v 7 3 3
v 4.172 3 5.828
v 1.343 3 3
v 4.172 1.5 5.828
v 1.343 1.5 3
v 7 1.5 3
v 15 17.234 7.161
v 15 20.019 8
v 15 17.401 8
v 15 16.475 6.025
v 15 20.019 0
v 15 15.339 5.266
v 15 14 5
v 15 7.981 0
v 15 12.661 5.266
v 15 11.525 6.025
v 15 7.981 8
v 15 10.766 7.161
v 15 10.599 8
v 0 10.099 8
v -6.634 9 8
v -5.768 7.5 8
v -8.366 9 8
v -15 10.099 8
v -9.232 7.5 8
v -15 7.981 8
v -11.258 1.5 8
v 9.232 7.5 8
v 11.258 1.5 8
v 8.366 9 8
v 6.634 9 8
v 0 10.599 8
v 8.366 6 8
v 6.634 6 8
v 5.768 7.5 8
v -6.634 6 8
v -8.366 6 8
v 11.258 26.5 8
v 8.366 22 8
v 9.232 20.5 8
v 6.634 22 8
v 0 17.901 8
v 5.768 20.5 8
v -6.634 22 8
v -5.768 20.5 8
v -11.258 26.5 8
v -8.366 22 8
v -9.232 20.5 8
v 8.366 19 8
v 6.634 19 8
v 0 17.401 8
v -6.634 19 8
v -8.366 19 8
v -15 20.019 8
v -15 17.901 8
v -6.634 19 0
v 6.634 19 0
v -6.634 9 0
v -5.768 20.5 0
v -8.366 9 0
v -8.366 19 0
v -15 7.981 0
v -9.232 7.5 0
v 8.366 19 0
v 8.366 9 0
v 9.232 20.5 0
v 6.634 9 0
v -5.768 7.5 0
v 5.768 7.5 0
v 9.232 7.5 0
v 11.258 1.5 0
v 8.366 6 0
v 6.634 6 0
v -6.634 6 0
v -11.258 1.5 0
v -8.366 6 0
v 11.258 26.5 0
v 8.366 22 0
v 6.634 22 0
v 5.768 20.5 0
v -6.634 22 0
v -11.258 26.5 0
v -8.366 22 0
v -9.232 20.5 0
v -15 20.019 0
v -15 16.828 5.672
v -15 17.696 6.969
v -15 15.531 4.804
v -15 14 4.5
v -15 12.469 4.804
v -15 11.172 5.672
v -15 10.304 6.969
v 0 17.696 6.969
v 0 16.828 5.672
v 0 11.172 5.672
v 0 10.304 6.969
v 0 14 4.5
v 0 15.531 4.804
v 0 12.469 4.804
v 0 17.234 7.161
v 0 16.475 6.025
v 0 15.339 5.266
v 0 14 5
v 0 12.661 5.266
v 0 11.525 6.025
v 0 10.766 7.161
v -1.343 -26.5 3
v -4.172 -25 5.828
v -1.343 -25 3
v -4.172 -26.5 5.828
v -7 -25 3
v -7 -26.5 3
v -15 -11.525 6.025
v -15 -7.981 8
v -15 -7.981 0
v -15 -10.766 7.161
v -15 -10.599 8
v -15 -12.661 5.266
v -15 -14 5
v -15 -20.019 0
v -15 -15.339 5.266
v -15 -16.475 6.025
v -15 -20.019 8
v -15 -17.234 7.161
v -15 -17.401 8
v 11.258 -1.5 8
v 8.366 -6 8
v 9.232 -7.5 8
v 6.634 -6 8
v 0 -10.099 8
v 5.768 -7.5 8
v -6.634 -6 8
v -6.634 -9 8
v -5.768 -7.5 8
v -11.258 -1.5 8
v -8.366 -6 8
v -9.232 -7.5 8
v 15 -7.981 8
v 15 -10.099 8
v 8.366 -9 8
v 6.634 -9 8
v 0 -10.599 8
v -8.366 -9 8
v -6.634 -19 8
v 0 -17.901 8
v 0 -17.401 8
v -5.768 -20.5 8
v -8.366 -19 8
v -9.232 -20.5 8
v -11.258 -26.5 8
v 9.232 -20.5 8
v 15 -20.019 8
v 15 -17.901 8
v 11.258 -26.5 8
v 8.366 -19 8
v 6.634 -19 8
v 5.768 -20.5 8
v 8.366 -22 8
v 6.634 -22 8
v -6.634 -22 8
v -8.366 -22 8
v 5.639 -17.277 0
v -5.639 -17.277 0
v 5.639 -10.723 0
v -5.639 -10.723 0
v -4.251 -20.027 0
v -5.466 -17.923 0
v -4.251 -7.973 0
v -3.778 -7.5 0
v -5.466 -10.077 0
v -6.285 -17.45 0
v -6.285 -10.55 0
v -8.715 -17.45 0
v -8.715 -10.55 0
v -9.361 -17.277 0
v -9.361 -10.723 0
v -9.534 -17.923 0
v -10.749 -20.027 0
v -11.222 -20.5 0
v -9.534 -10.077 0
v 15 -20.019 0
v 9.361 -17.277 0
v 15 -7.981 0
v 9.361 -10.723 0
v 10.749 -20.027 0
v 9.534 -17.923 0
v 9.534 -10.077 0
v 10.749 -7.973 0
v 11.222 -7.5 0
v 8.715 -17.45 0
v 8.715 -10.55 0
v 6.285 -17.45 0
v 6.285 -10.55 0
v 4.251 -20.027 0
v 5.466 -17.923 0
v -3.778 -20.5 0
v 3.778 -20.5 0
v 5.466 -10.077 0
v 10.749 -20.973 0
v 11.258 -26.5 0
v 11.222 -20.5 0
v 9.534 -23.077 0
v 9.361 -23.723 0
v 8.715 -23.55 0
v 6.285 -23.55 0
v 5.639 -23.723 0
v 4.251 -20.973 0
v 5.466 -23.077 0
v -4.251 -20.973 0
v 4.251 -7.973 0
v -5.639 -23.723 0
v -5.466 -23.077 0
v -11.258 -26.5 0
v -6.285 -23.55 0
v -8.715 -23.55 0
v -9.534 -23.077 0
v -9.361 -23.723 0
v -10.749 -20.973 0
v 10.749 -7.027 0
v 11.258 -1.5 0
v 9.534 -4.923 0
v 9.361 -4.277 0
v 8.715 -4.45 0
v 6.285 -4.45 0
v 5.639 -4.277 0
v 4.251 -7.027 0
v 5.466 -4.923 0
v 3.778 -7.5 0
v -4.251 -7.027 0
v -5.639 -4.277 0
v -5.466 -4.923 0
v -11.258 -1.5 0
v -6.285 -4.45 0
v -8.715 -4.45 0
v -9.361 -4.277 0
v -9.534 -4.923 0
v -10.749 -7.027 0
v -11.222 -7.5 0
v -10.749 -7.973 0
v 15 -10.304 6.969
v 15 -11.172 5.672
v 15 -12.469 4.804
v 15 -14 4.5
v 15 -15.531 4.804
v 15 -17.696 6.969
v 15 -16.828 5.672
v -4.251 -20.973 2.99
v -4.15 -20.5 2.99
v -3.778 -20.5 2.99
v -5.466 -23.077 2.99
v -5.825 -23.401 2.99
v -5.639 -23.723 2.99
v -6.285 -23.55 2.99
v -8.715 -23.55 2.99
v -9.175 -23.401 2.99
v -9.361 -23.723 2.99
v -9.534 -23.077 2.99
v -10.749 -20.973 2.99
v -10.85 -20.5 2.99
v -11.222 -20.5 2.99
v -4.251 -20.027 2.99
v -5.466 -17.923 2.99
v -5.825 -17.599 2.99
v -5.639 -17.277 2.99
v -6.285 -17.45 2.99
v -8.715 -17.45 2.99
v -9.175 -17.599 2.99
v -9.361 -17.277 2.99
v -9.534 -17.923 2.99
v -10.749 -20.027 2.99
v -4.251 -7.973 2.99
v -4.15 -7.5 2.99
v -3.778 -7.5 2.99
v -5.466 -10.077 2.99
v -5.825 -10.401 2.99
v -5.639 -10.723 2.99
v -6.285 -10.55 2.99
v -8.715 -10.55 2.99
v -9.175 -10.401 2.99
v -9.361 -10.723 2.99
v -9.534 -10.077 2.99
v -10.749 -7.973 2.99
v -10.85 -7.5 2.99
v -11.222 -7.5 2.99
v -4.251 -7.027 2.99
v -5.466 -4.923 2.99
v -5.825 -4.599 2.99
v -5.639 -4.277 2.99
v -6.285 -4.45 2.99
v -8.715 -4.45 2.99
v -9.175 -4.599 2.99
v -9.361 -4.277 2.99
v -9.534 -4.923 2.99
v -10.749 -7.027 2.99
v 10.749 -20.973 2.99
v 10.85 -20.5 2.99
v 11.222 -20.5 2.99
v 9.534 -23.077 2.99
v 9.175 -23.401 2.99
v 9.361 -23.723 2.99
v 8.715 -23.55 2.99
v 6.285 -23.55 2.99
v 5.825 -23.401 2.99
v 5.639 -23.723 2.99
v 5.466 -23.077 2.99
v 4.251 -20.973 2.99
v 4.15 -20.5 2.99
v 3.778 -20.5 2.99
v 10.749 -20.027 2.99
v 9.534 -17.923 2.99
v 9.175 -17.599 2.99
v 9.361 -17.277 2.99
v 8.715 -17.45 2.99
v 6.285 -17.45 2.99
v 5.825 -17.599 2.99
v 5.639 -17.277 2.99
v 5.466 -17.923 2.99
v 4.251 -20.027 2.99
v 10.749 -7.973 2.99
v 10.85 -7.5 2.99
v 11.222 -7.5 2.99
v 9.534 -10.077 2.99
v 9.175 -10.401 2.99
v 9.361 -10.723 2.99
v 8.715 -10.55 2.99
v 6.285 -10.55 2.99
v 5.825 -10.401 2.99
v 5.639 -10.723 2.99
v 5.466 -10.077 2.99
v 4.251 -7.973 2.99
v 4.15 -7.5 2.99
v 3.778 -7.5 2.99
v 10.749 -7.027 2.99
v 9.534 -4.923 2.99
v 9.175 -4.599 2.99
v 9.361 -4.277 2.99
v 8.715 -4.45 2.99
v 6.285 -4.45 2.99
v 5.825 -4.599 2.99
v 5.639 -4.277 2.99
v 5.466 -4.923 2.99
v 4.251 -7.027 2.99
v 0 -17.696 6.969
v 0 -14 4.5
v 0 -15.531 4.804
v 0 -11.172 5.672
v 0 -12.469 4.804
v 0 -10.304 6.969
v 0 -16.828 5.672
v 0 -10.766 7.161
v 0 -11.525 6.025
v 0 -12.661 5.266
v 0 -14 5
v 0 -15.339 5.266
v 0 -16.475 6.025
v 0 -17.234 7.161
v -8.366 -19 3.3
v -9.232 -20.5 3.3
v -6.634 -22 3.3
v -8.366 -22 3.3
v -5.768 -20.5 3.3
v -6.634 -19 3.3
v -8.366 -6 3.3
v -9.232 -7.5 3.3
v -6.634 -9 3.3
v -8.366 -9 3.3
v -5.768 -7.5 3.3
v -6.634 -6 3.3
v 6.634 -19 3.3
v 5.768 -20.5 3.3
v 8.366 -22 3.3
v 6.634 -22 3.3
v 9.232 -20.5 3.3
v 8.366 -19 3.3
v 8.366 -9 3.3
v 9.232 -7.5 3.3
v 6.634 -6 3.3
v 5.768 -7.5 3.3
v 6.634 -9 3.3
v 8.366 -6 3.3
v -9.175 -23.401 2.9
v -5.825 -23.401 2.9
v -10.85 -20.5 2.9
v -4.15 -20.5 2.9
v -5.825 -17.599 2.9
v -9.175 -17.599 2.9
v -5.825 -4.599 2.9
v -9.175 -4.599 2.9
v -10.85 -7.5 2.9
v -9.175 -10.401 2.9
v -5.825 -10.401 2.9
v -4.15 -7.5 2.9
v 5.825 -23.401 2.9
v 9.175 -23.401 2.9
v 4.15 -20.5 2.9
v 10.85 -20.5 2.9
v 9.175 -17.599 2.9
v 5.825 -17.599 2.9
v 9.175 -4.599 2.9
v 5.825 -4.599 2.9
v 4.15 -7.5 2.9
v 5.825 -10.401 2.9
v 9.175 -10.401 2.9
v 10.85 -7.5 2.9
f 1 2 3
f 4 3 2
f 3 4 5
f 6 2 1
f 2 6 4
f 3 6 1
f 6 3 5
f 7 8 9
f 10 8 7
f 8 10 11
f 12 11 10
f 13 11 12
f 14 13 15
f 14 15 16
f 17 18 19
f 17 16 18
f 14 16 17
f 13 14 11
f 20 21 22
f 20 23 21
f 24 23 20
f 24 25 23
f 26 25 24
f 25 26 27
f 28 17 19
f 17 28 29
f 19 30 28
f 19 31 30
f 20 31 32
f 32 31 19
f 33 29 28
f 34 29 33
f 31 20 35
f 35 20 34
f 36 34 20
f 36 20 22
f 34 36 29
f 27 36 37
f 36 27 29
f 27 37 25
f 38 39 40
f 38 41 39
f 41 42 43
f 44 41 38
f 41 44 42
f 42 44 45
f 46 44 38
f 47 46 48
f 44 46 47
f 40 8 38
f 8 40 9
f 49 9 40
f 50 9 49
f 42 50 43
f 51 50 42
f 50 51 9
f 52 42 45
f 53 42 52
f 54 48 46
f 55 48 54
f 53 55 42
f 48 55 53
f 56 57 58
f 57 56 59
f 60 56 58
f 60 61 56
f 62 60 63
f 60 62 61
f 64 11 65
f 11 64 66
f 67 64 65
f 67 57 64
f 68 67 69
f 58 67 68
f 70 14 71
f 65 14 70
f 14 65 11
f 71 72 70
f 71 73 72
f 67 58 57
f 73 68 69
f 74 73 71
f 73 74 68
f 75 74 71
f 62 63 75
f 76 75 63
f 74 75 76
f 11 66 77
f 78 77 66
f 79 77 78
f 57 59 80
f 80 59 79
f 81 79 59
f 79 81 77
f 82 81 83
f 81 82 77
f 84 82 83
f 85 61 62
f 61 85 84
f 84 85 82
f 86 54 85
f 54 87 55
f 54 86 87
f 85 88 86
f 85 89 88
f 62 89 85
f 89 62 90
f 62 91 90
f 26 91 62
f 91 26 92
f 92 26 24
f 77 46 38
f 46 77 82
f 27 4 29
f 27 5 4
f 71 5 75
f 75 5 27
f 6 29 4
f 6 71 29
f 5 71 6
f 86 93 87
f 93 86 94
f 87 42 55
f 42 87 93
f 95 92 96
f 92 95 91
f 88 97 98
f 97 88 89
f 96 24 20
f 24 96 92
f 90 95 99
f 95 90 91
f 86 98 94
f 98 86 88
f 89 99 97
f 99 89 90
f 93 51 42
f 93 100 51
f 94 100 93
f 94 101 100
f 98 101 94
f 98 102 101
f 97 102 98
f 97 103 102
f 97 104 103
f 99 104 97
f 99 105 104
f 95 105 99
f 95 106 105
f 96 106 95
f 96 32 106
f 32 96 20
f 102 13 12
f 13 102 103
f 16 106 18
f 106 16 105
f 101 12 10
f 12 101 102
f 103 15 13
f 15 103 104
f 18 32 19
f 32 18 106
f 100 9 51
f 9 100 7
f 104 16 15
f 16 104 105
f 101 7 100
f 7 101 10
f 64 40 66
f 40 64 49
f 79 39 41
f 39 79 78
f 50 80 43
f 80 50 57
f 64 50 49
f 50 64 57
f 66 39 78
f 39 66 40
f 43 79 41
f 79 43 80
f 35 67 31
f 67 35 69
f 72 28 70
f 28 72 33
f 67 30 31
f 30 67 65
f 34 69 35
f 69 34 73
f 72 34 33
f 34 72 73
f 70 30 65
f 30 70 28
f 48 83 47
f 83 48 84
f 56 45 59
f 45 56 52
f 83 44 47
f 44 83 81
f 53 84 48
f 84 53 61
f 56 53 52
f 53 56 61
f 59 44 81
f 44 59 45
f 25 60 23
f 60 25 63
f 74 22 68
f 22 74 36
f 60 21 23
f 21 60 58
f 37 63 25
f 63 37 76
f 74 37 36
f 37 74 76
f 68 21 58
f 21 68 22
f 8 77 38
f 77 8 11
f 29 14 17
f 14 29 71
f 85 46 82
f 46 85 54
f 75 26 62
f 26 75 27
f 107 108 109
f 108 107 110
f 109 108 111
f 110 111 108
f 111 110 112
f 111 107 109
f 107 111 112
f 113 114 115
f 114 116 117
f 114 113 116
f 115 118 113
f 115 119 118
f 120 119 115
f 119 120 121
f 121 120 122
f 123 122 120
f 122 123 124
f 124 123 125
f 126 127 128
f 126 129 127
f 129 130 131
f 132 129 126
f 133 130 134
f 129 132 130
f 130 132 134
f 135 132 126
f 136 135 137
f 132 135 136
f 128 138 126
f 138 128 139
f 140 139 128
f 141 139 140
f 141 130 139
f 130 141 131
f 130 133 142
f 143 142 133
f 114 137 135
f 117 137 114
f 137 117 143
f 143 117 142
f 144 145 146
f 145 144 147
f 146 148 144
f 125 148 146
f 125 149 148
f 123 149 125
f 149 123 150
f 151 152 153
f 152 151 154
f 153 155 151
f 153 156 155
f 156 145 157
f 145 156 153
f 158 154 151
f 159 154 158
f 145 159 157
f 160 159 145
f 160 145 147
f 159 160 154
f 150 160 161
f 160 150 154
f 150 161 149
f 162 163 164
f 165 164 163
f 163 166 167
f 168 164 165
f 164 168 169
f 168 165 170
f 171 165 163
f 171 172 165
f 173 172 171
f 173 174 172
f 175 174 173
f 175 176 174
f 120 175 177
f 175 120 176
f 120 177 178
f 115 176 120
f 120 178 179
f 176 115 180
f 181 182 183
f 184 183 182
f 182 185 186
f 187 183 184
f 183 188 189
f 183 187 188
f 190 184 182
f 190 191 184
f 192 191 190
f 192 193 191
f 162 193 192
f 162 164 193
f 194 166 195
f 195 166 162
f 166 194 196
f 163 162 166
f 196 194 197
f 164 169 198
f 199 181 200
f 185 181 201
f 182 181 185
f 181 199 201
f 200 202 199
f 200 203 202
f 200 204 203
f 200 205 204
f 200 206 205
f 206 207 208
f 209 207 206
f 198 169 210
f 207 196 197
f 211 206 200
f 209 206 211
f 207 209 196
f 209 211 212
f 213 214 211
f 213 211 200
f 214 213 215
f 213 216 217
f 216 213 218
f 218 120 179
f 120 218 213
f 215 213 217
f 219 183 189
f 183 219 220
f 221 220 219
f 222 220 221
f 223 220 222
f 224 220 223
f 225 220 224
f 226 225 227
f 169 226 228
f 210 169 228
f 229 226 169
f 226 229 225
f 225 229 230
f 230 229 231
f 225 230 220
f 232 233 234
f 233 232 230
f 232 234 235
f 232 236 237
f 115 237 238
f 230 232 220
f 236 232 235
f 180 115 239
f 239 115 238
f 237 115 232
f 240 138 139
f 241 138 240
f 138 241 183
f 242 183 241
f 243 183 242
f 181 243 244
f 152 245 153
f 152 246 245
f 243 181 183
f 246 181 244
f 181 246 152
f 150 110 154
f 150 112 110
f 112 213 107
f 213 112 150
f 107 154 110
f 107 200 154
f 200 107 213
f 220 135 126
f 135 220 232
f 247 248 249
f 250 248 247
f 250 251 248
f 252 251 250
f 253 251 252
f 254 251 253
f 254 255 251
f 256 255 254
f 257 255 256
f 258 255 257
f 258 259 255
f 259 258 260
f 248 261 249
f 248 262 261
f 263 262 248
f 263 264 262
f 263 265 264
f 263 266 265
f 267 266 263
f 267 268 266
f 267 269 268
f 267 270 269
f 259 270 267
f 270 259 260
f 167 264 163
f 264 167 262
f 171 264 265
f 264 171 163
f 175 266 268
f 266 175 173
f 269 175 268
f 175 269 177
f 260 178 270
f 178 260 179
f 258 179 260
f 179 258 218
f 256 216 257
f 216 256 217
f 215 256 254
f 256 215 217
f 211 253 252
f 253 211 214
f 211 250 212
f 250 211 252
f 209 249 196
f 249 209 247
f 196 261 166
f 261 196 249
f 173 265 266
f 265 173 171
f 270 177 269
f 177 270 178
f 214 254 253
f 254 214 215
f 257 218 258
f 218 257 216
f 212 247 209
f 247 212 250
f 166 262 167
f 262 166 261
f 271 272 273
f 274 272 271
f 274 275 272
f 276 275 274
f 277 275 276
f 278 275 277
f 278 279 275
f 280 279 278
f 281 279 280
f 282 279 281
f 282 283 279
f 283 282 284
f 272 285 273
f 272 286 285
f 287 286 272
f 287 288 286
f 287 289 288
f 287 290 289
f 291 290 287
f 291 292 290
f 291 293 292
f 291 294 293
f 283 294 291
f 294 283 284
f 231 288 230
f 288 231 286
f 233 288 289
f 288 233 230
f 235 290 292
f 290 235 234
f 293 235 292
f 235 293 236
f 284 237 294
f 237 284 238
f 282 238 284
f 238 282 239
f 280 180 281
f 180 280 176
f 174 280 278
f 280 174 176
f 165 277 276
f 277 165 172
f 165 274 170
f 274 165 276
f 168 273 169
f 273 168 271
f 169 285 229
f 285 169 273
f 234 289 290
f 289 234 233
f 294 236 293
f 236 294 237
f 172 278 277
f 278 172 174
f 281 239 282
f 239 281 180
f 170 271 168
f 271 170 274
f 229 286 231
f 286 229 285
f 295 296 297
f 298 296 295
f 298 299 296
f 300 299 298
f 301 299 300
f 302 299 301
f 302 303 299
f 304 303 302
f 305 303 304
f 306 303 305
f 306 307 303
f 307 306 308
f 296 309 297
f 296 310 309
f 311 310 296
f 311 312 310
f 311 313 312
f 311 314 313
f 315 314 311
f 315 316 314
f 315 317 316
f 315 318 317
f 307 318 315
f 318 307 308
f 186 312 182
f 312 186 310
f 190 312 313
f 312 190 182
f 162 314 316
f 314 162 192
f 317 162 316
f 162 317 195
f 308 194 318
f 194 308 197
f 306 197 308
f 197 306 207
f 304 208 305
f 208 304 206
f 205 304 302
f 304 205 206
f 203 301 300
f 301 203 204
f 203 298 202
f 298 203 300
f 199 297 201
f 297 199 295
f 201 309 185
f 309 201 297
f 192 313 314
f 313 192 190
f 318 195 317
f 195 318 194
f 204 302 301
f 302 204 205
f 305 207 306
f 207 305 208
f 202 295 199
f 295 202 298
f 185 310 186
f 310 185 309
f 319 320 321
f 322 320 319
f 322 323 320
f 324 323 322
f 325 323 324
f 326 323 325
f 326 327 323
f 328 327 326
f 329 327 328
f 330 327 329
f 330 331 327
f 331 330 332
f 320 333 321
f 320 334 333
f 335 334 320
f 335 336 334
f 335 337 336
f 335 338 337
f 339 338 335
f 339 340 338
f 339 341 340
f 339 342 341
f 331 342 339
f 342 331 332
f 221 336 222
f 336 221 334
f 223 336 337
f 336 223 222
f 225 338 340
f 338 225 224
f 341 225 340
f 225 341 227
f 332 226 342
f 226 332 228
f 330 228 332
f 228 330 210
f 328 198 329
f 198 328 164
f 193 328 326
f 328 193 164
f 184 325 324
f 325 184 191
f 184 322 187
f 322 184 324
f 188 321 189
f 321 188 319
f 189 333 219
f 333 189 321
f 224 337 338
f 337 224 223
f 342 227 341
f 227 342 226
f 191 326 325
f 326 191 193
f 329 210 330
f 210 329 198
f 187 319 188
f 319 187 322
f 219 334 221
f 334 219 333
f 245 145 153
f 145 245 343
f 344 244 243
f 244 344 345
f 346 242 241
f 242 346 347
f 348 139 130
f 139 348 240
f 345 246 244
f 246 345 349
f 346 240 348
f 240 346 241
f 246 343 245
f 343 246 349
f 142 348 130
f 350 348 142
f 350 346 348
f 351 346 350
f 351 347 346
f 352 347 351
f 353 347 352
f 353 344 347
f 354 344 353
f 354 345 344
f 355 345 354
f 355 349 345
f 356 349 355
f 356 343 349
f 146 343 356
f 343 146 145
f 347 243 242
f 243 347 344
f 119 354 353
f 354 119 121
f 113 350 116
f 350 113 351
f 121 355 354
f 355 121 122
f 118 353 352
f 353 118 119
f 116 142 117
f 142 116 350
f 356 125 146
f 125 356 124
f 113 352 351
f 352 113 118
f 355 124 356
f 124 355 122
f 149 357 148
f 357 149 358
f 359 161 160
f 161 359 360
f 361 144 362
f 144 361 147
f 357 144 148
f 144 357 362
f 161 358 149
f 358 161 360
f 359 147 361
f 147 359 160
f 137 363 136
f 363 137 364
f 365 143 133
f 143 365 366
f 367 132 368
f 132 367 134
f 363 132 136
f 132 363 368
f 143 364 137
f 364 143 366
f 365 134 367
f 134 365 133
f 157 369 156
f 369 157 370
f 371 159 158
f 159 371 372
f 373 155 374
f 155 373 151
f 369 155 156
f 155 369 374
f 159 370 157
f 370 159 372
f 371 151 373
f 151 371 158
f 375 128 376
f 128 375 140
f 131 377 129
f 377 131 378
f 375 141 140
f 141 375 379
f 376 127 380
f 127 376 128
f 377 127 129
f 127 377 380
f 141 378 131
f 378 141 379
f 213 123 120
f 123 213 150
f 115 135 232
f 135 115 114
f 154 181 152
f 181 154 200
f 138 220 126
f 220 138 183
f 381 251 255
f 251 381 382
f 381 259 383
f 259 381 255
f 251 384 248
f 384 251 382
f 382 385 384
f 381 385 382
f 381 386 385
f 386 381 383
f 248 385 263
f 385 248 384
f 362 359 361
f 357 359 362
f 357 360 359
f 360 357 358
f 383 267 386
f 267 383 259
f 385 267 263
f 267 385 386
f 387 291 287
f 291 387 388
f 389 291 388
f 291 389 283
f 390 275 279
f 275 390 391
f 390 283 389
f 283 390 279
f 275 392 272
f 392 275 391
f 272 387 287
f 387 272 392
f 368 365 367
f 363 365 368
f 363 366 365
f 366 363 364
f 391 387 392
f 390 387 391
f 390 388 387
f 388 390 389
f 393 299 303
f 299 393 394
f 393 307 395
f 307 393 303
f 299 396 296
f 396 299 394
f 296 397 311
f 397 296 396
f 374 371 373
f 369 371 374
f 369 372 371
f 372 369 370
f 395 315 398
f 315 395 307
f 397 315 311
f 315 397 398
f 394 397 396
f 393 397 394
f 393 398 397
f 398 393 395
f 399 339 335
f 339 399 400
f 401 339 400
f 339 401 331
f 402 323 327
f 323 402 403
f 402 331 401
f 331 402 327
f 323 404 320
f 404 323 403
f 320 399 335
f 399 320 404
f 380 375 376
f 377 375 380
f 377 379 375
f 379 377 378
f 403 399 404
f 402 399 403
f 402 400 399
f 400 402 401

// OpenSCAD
// file: functions.scad
// PRUSA Mendel  
// Functions used in many files
// GNU GPL v3
// Josef Průša
// josefprusa@me.com
// prusadjs.cz
// http://www.reprap.org/wiki/Prusa_Mendel
// http://github.com/prusajr/PrusaMendel


module nut(d,h,horizontal=true) {
	cornerdiameter = (d / 2) / cos (180 / 6);
	cylinder(h = h, r = cornerdiameter, $fn = 6);
	if(horizontal) {
		for(i = [1:6]) {
			rotate([0,0,60*i]) translate([-cornerdiameter-0.2,0,0]) rotate([0,0,-45]) cube(size = [2,2,h]);
		}
	}
}

// Based on nophead research
module polyhole(d,h) {
	n = max(round(2 * d),3);
	rotate([0,0,180])
		cylinder(h = h, r = (d / 2) / cos (180 / n), $fn = n);
}

module roundcorner(diameter) {
	difference() {
		cube(size = [diameter,diameter,99], center = false);
		translate(v = [diameter, diameter, 0]) cylinder(h = 100, r=diameter, center=true);
	}
}
// file: metric.scad
// PRUSA Mendel  
// Default metric sizes
// GNU GPL v2
// Josef Průša
// josefprusa@me.com
// prusadjs.cz
// http://www.reprap.org/wiki/Prusa_Mendel
// http://github.com/prusajr/PrusaMendel

// DONT CHANGE THIS FILE! ALTER VALUES IN CONFIGURATION.SCAD INSTEAD

// RODS

threaded_rod_diameter = 8.2;
threaded_rod_diameter_horizontal = 8.2;
smooth_bar_diameter = 8;
smooth_bar_diameter_horizontal = 8.5;

// Nuts and bolts
// Nut diameters are flat to flat

m8_diameter = 9;
m8_nut_diameter = 16.4;
m8_nut_thickness = 6.5;

m4_diameter = 4.5;
m4_nut_diameter = 9;
m4_nut_thickness = 3.2;

m3_diameter = 3.6;
m3_nut_diameter = 6.1;
m3_nut_thickness = 2.4;

// Bushing holder

bushing_core_diameter = smooth_bar_diameter;
bushing_material_thickness = 1;

// Motors

motor_shaft = 5.5;
// file: configuration.scad
// PRUSA Mendel  
// Configuration file
// GNU GPL v3
// Josef Průša
// josefprusa@me.com
// prusadjs.cz
// http://www.reprap.org/wiki/Prusa_Mendel
// http://github.com/prusajr/PrusaMendel

// PLEASE SELECT ONE OF THE CONFIGURATIONS BELOW
// BY UN-COMMENTING IT

// Uncomment for metric settings
// METRIC METRIC METRIC METRIC METRIC METRIC METRIC METRIC 

include <metric.scad>;

// CUSTOM CUSTOM CUSTOM CUSTOM CUSTOM CUSTOM CUSTOM CUSTOM CUSTOM

thin_wall = 3;


// Linear bearing version
linear = true;
// set false for LM-8UU, true for LM-E-8UU (ignore if linear is set to false)
lme8uu = false;



// CHANGE ONLY THE STUFF YOU KNOW
// IT WILL REPLACE DEFAULT SETTING

// RODS

// threaded_rod_diameter = 0;
// threaded_rod_diameter_horizontal = 0;
// smooth_bar_diameter = 0;
// smooth_bar_diameter_horizontal = 0;

// Nuts and bolts

// m8_diameter = 0;
// m8_nut_diameter = 0;

// m4_diameter = 0;
// m4_nut_diameter = 0;

m3_diameter = 3; // polyholes need the exact measurement
// m3_nut_diameter = 0;

// Bushing holder

// bushing_core_diameter = smooth_bar_diameter;
// bushing_material_thickness = 0;


///counted stuff
m3_nut_diameter_bigger = ((m3_nut_diameter  / 2) / cos (180 / 6))*2;

// functions 
include <functions.scad>
// main file
// This one is AWESOME design by NOPHEAD

// PRUSA Mendel  
// Coupling from nophead
// GNU GPL v3
// Josef Průša
// josefprusa@me.com
// prusadjs.cz
// http://www.reprap.org/wiki/Prusa_Mendel
// http://github.com/prusajr/PrusaMendel

include <configuration.scad>

/**
 * @id coupling
 * @name Coupling
 * @category Printed
 * @using 4 m3x20
 * @using 4 m3washer
 * @using 4 m3nut
 * @step Place M3 nuts in all nut traps.
 * @step Insert screws with washers on them and tighet it just a bit.
 */

/**
 * 20mm long piece of PVC tube. 5mm inside diameter, 8mm outside diameter.
 * @id coupling-tube
 * @name Coupling tube
 * @category Nuts&bolts
 */

holeX = 7.5;
holeY = 6.5;

holeR = 3.4;
nutR = 3.25;
nutH = 3;
corner_cut = 26;

studding_dia = 8.0;
shaft_dia = 7.0;

module coupling(c){
	union(){
		difference(){
			difference() {
				cube(size = [30,25,8], center = true);
				translate([7, c==1 ? 11 : -13,-1]) rotate([-45,0,90]) difference() {
					cube([2,4,4]);
					rotate([-45,0,0]) cube([2,8,8]);
				}
			}

			if(c==1){
				//slot
				*cube(size = [2,40,30], center = true);
				
				//nut holes
				translate([ holeX,  holeY, nutH/2 - 4.01-3/2]) nut(m3_nut_diameter,3);
				translate([ holeX, -holeY, nutH/2 - 4.01-3/2]) nut(m3_nut_diameter,3);
				translate([-holeX,  holeY, nutH/2 - 4.01-3/2]) nut(m3_nut_diameter,3);
				translate([-holeX, -holeY, nutH/2 - 4.01-3/2]) nut(m3_nut_diameter,3);
			}

			//shaft groves
			translate([ -16, 0, 4.5]) rotate([0,90,0]) cylinder(h = 16, r=studding_dia / 2, $fn=16);
			translate([-0.5, 0, 4.5]) rotate([0,90,0]) cylinder(h = 16, r=shaft_dia / 2,    $fn=16);

			//screw holes
			translate([ holeX,  holeY, -10]) polyhole(m3_diameter, 20);
			translate([ holeX, -holeY, -10]) polyhole(m3_diameter, 20);
			translate([-holeX,  holeY, -10]) polyhole(m3_diameter, 20);
			translate([-holeX, -holeY, -10]) polyhole(m3_diameter, 20);

			//corners
			rotate([0,0,30])   translate([corner_cut, 0, 0]) cube(size = [20,40,20], center = true);
			rotate([0,0,-30])  translate([corner_cut, 0, 0]) cube(size = [20,40,20], center = true);
			rotate([0,0,150])  translate([corner_cut, 0, 0]) cube(size = [20,40,20], center = true);
			rotate([0,0,-150]) translate([corner_cut, 0, 0]) cube(size = [20,40,20], center = true);
		}
		if(c==1) {
			// bridge
			translate([ holeX,  holeY, nutH-3.9]) cylinder(h = 0.4, r=nutR+0.1, $fn=6, center=true);
			translate([ holeX, -holeY, nutH-3.9]) cylinder(h = 0.4, r=nutR+0.1, $fn=6, center=true);
			translate([-holeX,  holeY, nutH-3.9]) cylinder(h = 0.4, r=nutR+0.1, $fn=6, center=true);
			translate([-holeX, -holeY, nutH-3.9]) cylinder(h = 0.4, r=nutR+0.1, $fn=6, center=true);
		}
	}
}

translate([0, 14, 4]) coupling(c=0);
translate([0, -14, 4]) rotate([0,0,180]) coupling(c=1);
